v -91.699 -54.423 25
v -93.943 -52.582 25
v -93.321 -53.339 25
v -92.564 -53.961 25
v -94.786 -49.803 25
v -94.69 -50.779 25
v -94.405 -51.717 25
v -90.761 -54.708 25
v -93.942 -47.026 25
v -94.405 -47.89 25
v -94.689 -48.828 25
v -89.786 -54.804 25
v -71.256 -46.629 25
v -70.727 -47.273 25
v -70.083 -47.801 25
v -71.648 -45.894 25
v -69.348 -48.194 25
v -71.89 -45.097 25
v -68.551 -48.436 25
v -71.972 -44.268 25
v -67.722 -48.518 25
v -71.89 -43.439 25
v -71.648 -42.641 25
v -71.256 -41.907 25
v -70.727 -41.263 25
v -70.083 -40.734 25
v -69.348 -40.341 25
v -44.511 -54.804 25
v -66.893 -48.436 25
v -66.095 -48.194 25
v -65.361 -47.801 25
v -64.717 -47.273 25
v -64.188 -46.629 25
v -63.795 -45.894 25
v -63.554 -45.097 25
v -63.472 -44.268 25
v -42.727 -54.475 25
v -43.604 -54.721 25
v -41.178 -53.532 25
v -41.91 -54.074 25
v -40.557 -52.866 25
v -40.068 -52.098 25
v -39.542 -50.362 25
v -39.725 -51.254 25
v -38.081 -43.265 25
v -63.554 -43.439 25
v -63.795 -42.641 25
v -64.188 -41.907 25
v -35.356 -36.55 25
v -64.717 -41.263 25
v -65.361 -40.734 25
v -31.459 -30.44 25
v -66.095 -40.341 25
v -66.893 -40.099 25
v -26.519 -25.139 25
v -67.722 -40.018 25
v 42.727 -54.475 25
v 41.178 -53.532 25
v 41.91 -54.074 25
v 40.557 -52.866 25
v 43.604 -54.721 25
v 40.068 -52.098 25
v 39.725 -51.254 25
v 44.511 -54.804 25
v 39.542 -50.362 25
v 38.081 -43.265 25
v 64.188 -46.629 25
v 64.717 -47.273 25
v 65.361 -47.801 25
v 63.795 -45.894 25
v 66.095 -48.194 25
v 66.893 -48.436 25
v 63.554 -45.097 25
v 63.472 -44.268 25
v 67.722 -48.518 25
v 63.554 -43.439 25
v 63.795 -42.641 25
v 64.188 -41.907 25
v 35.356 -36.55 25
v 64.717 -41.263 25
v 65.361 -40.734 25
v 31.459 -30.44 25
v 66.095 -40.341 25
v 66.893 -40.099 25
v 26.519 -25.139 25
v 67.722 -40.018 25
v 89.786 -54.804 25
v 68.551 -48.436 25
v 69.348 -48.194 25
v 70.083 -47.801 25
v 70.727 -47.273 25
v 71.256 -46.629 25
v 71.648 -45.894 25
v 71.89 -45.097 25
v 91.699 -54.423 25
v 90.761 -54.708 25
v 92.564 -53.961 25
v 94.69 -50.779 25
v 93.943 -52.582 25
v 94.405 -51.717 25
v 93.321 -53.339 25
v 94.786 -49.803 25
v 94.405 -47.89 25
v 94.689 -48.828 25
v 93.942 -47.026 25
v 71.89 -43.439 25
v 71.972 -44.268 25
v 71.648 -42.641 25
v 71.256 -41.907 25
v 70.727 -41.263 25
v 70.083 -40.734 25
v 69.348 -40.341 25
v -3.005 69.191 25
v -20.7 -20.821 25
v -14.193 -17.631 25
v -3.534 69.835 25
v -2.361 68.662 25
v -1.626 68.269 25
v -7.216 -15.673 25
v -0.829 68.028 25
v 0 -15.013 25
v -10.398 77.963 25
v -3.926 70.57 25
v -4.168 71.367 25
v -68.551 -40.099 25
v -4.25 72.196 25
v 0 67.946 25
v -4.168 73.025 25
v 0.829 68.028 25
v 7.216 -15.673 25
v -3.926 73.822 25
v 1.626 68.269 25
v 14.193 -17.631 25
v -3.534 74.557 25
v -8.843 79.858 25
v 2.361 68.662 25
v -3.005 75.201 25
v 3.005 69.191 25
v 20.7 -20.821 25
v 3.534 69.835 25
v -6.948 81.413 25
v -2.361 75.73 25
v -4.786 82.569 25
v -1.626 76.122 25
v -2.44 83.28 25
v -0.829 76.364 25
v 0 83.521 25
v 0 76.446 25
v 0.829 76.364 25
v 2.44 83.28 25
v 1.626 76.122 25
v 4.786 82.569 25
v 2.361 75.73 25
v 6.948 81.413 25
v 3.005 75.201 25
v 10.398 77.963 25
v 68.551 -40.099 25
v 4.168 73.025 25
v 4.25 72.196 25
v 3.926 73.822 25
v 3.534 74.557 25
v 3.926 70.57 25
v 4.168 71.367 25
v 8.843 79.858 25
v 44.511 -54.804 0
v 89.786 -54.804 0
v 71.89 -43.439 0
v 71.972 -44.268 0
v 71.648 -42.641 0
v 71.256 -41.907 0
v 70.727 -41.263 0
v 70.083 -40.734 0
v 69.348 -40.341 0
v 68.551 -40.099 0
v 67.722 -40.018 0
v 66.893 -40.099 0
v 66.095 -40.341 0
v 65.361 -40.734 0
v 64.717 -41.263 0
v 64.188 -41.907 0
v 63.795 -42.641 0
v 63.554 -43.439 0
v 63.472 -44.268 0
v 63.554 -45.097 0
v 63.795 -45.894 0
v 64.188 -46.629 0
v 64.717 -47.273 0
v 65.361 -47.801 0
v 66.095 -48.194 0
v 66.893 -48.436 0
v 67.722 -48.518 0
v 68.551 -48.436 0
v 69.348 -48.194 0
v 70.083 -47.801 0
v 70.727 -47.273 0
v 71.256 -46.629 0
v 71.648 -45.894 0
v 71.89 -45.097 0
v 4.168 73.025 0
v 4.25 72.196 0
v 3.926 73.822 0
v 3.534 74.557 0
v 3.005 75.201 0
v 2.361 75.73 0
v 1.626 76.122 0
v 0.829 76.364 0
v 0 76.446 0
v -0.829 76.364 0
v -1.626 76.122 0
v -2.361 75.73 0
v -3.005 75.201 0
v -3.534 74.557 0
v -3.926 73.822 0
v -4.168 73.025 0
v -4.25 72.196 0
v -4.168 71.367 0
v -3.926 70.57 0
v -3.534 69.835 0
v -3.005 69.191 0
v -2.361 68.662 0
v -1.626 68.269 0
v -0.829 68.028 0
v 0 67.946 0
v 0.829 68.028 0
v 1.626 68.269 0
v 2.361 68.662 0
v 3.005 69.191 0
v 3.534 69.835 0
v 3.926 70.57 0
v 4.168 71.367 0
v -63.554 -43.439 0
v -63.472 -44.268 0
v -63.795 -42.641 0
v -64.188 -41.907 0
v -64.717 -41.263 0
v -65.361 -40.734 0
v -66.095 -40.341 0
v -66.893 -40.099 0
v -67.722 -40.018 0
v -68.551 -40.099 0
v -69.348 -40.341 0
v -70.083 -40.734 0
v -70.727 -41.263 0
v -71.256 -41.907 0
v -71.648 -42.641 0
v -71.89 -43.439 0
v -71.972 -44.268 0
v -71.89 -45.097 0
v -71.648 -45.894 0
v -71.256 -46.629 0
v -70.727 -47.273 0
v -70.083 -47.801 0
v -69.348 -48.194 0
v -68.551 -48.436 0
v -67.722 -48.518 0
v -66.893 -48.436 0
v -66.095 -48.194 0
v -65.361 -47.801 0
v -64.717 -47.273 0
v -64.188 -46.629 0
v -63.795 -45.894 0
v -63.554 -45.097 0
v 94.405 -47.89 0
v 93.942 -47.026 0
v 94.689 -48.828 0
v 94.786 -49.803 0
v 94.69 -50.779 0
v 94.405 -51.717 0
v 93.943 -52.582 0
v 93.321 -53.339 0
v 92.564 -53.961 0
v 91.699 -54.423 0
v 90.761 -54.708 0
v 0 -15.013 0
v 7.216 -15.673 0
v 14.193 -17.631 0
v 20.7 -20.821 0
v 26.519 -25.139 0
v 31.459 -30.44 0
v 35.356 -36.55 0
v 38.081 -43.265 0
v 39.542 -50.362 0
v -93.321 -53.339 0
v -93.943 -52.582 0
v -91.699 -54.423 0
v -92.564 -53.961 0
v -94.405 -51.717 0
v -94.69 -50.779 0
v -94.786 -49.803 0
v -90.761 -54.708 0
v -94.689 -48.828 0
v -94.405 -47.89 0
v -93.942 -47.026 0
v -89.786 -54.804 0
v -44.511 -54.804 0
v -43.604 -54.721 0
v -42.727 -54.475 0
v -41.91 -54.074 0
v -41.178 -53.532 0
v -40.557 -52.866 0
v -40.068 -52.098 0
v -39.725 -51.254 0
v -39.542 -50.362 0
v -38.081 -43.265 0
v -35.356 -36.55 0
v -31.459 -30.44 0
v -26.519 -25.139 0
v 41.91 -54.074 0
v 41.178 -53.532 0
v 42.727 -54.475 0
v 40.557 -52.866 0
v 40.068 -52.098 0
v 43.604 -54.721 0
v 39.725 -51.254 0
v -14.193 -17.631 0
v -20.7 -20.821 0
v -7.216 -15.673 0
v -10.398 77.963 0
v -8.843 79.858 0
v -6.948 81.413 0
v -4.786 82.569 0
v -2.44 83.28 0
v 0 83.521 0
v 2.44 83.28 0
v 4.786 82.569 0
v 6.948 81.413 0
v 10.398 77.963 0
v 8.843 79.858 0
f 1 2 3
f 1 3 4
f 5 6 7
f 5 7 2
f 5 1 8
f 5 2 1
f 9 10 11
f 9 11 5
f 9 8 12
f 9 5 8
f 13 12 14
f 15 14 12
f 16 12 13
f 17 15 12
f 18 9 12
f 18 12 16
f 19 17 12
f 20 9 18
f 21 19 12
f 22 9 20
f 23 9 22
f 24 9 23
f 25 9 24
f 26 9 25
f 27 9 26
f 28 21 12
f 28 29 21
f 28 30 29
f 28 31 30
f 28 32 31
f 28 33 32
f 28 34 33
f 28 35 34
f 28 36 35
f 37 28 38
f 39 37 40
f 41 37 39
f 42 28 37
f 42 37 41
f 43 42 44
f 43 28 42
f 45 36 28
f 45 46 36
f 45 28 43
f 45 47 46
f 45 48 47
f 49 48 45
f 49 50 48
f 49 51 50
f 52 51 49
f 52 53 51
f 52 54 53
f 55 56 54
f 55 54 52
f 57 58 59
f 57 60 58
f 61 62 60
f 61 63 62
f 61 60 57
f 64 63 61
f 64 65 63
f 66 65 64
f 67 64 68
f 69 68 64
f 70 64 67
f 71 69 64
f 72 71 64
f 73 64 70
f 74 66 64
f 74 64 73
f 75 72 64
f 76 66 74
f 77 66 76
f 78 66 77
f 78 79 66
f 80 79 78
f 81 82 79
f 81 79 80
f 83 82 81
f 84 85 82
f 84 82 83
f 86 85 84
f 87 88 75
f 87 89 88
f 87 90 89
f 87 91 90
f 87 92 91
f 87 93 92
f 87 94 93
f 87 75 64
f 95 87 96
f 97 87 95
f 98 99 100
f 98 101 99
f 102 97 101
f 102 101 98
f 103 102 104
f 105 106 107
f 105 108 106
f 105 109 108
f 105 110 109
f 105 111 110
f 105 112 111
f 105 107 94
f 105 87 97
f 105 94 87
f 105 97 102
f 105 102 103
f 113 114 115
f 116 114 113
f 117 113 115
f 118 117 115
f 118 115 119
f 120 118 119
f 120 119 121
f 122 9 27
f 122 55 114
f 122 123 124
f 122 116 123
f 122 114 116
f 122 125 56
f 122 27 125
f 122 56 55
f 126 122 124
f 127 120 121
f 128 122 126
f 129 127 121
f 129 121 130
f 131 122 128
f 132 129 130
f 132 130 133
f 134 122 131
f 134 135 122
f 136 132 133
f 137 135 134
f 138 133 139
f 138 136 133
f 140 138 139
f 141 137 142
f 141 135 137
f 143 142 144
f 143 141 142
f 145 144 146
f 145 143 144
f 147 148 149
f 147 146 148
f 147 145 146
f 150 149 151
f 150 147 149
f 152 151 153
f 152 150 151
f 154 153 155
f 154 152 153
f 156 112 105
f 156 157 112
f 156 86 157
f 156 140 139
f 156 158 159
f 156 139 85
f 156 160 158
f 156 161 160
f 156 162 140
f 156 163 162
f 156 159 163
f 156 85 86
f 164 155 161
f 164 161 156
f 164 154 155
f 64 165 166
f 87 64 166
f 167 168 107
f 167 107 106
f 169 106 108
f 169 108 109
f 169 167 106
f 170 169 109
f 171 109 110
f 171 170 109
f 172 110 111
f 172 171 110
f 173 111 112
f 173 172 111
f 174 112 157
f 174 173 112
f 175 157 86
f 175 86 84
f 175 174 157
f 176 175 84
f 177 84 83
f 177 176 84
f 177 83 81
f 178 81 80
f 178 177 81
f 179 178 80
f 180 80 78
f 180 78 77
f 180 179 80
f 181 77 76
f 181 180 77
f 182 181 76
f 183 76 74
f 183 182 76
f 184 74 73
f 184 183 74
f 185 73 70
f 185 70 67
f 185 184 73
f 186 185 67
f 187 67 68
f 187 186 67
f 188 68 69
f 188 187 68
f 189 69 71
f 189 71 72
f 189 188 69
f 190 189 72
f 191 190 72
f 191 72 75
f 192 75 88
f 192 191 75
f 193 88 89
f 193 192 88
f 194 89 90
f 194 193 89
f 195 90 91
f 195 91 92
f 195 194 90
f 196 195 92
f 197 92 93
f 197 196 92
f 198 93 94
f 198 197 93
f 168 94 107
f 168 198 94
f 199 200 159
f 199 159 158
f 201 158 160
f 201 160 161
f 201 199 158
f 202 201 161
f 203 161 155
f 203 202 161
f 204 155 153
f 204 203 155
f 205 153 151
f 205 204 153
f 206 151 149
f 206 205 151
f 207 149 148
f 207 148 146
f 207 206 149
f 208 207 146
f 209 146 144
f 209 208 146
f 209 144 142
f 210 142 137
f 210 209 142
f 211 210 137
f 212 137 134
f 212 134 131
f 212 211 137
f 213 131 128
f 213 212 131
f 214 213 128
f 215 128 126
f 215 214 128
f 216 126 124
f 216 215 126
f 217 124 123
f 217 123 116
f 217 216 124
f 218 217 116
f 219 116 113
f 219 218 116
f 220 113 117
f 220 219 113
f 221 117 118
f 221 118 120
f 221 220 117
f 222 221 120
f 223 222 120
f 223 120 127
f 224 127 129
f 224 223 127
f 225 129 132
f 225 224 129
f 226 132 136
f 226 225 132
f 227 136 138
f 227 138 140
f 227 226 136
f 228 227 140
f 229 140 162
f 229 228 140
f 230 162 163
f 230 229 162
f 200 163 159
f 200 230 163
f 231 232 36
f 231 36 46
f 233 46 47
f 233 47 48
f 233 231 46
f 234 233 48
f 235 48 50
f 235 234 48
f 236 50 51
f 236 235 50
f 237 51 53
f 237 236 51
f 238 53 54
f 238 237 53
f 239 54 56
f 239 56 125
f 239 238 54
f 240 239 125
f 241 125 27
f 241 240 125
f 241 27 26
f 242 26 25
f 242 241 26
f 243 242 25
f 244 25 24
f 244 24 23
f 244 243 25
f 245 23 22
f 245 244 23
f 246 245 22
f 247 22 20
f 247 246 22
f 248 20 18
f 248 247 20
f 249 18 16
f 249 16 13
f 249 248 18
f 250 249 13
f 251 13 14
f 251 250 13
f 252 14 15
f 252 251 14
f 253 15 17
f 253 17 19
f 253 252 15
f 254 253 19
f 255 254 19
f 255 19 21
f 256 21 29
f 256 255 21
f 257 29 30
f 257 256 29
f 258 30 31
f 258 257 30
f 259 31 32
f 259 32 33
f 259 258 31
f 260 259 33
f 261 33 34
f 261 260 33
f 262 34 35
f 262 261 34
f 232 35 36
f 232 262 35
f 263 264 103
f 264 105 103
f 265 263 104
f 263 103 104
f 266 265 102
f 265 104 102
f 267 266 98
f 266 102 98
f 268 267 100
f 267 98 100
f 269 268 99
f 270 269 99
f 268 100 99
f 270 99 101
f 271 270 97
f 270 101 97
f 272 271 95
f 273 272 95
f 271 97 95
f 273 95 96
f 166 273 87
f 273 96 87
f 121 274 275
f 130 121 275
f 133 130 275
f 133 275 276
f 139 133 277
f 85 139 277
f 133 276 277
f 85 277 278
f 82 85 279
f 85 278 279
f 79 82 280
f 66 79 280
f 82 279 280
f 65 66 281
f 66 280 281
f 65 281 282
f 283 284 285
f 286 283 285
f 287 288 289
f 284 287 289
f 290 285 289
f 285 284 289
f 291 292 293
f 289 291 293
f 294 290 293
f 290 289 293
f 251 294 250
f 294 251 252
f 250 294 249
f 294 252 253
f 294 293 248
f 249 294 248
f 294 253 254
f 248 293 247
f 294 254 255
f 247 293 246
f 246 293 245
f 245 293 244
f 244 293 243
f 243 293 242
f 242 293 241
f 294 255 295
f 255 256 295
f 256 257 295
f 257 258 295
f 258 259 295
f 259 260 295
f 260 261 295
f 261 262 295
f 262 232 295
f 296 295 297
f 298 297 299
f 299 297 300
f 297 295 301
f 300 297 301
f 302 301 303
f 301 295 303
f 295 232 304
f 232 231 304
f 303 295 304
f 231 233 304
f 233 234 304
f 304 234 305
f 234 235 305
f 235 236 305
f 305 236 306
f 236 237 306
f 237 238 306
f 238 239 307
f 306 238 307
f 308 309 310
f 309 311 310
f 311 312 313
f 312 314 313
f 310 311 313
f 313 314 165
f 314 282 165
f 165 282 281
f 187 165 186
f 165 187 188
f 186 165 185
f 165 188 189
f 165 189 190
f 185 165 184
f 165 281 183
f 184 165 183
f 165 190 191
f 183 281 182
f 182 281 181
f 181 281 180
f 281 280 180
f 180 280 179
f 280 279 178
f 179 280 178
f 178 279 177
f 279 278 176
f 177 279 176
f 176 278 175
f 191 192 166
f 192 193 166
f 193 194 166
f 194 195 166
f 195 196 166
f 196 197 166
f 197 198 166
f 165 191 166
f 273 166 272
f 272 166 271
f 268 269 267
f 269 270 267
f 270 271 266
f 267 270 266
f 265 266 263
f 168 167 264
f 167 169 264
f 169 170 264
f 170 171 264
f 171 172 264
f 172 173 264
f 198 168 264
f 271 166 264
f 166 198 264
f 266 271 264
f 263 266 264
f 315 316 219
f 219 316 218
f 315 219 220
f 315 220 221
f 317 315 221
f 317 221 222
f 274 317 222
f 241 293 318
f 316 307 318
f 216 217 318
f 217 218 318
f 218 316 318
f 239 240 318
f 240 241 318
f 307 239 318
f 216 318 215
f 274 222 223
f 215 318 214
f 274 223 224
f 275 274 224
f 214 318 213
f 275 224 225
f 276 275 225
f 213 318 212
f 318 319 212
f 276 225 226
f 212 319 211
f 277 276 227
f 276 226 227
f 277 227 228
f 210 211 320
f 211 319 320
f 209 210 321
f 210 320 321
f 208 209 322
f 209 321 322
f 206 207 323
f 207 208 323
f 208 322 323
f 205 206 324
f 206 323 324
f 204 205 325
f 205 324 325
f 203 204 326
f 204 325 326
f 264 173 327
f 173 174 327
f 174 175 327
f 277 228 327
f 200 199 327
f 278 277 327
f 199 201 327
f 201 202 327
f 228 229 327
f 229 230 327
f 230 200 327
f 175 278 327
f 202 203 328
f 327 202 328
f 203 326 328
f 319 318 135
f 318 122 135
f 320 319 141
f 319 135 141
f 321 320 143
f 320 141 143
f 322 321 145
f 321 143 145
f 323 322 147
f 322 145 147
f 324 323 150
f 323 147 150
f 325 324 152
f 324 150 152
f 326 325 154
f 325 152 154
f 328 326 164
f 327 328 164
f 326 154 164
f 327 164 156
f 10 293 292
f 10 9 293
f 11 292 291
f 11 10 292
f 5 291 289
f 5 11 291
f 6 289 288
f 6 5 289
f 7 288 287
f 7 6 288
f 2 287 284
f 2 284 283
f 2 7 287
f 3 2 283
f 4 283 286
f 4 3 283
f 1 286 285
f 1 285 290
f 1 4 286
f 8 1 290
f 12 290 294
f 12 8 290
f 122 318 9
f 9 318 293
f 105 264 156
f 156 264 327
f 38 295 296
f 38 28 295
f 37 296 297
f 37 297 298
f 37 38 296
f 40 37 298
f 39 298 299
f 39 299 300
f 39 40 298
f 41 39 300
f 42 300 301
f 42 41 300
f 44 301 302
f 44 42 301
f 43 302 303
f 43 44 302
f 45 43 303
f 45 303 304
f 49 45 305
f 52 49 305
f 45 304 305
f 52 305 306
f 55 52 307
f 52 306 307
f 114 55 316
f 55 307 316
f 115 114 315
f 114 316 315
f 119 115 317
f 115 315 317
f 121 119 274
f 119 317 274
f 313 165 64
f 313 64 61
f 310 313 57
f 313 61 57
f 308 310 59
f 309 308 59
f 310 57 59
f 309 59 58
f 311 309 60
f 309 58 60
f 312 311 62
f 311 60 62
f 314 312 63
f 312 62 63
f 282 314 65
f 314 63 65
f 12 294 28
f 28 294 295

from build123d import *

# Parameters (mm, degrees)
F0_R     = 4.25
F1_DEPTH = 25
F2_R     = 12.507492
F3_R     = 5


with BuildPart() as f1:
    # F0 (on Top) → F1 (new body)
    with BuildSketch(Plane.XY):
        with BuildLine():
            Line((0, 93.520519), (-99.141695, -54.804042))
            Line((-99.141695, -54.804042), (-39.790552, -54.804042))
            ThreePointArc((-39.790552, -54.804042), (-28.136169, -26.667873), (0, -15.01349))
            ThreePointArc((0, -15.01349), (28.136169, -26.667873), (39.790552, -54.804042))
            Line((39.790552, -54.804042), (99.141695, -54.804042))
            Line((99.141695, -54.804042), (0, 93.520519))
        make_face()
        with Locations((-67.721896, -44.267751)):
            Circle(F0_R, mode=Mode.SUBTRACT)
        with Locations((67.721896, -44.267751)):
            Circle(F0_R, mode=Mode.SUBTRACT)
        with Locations((0, 72.195958)):
            Circle(F0_R, mode=Mode.SUBTRACT)
    extrude(amount=F1_DEPTH)

    # F2
    f2_edges = [f1.edges().sort_by_distance(p)[0] for p in [
        (0, 93.520519, 12.5),
    ]]
    fillet(f2_edges, radius=F2_R)

    # F3
    f3_edges = [f1.edges().sort_by_distance(p)[0] for p in [
        (-39.790552, -54.804042, 12.5),
        (39.790552, -54.804042, 12.5),
        (99.141695, -54.804042, 12.5),
        (-99.141695, -54.804042, 12.5),
    ]]
    fillet(f3_edges, radius=F3_R)


solid = f1.part
